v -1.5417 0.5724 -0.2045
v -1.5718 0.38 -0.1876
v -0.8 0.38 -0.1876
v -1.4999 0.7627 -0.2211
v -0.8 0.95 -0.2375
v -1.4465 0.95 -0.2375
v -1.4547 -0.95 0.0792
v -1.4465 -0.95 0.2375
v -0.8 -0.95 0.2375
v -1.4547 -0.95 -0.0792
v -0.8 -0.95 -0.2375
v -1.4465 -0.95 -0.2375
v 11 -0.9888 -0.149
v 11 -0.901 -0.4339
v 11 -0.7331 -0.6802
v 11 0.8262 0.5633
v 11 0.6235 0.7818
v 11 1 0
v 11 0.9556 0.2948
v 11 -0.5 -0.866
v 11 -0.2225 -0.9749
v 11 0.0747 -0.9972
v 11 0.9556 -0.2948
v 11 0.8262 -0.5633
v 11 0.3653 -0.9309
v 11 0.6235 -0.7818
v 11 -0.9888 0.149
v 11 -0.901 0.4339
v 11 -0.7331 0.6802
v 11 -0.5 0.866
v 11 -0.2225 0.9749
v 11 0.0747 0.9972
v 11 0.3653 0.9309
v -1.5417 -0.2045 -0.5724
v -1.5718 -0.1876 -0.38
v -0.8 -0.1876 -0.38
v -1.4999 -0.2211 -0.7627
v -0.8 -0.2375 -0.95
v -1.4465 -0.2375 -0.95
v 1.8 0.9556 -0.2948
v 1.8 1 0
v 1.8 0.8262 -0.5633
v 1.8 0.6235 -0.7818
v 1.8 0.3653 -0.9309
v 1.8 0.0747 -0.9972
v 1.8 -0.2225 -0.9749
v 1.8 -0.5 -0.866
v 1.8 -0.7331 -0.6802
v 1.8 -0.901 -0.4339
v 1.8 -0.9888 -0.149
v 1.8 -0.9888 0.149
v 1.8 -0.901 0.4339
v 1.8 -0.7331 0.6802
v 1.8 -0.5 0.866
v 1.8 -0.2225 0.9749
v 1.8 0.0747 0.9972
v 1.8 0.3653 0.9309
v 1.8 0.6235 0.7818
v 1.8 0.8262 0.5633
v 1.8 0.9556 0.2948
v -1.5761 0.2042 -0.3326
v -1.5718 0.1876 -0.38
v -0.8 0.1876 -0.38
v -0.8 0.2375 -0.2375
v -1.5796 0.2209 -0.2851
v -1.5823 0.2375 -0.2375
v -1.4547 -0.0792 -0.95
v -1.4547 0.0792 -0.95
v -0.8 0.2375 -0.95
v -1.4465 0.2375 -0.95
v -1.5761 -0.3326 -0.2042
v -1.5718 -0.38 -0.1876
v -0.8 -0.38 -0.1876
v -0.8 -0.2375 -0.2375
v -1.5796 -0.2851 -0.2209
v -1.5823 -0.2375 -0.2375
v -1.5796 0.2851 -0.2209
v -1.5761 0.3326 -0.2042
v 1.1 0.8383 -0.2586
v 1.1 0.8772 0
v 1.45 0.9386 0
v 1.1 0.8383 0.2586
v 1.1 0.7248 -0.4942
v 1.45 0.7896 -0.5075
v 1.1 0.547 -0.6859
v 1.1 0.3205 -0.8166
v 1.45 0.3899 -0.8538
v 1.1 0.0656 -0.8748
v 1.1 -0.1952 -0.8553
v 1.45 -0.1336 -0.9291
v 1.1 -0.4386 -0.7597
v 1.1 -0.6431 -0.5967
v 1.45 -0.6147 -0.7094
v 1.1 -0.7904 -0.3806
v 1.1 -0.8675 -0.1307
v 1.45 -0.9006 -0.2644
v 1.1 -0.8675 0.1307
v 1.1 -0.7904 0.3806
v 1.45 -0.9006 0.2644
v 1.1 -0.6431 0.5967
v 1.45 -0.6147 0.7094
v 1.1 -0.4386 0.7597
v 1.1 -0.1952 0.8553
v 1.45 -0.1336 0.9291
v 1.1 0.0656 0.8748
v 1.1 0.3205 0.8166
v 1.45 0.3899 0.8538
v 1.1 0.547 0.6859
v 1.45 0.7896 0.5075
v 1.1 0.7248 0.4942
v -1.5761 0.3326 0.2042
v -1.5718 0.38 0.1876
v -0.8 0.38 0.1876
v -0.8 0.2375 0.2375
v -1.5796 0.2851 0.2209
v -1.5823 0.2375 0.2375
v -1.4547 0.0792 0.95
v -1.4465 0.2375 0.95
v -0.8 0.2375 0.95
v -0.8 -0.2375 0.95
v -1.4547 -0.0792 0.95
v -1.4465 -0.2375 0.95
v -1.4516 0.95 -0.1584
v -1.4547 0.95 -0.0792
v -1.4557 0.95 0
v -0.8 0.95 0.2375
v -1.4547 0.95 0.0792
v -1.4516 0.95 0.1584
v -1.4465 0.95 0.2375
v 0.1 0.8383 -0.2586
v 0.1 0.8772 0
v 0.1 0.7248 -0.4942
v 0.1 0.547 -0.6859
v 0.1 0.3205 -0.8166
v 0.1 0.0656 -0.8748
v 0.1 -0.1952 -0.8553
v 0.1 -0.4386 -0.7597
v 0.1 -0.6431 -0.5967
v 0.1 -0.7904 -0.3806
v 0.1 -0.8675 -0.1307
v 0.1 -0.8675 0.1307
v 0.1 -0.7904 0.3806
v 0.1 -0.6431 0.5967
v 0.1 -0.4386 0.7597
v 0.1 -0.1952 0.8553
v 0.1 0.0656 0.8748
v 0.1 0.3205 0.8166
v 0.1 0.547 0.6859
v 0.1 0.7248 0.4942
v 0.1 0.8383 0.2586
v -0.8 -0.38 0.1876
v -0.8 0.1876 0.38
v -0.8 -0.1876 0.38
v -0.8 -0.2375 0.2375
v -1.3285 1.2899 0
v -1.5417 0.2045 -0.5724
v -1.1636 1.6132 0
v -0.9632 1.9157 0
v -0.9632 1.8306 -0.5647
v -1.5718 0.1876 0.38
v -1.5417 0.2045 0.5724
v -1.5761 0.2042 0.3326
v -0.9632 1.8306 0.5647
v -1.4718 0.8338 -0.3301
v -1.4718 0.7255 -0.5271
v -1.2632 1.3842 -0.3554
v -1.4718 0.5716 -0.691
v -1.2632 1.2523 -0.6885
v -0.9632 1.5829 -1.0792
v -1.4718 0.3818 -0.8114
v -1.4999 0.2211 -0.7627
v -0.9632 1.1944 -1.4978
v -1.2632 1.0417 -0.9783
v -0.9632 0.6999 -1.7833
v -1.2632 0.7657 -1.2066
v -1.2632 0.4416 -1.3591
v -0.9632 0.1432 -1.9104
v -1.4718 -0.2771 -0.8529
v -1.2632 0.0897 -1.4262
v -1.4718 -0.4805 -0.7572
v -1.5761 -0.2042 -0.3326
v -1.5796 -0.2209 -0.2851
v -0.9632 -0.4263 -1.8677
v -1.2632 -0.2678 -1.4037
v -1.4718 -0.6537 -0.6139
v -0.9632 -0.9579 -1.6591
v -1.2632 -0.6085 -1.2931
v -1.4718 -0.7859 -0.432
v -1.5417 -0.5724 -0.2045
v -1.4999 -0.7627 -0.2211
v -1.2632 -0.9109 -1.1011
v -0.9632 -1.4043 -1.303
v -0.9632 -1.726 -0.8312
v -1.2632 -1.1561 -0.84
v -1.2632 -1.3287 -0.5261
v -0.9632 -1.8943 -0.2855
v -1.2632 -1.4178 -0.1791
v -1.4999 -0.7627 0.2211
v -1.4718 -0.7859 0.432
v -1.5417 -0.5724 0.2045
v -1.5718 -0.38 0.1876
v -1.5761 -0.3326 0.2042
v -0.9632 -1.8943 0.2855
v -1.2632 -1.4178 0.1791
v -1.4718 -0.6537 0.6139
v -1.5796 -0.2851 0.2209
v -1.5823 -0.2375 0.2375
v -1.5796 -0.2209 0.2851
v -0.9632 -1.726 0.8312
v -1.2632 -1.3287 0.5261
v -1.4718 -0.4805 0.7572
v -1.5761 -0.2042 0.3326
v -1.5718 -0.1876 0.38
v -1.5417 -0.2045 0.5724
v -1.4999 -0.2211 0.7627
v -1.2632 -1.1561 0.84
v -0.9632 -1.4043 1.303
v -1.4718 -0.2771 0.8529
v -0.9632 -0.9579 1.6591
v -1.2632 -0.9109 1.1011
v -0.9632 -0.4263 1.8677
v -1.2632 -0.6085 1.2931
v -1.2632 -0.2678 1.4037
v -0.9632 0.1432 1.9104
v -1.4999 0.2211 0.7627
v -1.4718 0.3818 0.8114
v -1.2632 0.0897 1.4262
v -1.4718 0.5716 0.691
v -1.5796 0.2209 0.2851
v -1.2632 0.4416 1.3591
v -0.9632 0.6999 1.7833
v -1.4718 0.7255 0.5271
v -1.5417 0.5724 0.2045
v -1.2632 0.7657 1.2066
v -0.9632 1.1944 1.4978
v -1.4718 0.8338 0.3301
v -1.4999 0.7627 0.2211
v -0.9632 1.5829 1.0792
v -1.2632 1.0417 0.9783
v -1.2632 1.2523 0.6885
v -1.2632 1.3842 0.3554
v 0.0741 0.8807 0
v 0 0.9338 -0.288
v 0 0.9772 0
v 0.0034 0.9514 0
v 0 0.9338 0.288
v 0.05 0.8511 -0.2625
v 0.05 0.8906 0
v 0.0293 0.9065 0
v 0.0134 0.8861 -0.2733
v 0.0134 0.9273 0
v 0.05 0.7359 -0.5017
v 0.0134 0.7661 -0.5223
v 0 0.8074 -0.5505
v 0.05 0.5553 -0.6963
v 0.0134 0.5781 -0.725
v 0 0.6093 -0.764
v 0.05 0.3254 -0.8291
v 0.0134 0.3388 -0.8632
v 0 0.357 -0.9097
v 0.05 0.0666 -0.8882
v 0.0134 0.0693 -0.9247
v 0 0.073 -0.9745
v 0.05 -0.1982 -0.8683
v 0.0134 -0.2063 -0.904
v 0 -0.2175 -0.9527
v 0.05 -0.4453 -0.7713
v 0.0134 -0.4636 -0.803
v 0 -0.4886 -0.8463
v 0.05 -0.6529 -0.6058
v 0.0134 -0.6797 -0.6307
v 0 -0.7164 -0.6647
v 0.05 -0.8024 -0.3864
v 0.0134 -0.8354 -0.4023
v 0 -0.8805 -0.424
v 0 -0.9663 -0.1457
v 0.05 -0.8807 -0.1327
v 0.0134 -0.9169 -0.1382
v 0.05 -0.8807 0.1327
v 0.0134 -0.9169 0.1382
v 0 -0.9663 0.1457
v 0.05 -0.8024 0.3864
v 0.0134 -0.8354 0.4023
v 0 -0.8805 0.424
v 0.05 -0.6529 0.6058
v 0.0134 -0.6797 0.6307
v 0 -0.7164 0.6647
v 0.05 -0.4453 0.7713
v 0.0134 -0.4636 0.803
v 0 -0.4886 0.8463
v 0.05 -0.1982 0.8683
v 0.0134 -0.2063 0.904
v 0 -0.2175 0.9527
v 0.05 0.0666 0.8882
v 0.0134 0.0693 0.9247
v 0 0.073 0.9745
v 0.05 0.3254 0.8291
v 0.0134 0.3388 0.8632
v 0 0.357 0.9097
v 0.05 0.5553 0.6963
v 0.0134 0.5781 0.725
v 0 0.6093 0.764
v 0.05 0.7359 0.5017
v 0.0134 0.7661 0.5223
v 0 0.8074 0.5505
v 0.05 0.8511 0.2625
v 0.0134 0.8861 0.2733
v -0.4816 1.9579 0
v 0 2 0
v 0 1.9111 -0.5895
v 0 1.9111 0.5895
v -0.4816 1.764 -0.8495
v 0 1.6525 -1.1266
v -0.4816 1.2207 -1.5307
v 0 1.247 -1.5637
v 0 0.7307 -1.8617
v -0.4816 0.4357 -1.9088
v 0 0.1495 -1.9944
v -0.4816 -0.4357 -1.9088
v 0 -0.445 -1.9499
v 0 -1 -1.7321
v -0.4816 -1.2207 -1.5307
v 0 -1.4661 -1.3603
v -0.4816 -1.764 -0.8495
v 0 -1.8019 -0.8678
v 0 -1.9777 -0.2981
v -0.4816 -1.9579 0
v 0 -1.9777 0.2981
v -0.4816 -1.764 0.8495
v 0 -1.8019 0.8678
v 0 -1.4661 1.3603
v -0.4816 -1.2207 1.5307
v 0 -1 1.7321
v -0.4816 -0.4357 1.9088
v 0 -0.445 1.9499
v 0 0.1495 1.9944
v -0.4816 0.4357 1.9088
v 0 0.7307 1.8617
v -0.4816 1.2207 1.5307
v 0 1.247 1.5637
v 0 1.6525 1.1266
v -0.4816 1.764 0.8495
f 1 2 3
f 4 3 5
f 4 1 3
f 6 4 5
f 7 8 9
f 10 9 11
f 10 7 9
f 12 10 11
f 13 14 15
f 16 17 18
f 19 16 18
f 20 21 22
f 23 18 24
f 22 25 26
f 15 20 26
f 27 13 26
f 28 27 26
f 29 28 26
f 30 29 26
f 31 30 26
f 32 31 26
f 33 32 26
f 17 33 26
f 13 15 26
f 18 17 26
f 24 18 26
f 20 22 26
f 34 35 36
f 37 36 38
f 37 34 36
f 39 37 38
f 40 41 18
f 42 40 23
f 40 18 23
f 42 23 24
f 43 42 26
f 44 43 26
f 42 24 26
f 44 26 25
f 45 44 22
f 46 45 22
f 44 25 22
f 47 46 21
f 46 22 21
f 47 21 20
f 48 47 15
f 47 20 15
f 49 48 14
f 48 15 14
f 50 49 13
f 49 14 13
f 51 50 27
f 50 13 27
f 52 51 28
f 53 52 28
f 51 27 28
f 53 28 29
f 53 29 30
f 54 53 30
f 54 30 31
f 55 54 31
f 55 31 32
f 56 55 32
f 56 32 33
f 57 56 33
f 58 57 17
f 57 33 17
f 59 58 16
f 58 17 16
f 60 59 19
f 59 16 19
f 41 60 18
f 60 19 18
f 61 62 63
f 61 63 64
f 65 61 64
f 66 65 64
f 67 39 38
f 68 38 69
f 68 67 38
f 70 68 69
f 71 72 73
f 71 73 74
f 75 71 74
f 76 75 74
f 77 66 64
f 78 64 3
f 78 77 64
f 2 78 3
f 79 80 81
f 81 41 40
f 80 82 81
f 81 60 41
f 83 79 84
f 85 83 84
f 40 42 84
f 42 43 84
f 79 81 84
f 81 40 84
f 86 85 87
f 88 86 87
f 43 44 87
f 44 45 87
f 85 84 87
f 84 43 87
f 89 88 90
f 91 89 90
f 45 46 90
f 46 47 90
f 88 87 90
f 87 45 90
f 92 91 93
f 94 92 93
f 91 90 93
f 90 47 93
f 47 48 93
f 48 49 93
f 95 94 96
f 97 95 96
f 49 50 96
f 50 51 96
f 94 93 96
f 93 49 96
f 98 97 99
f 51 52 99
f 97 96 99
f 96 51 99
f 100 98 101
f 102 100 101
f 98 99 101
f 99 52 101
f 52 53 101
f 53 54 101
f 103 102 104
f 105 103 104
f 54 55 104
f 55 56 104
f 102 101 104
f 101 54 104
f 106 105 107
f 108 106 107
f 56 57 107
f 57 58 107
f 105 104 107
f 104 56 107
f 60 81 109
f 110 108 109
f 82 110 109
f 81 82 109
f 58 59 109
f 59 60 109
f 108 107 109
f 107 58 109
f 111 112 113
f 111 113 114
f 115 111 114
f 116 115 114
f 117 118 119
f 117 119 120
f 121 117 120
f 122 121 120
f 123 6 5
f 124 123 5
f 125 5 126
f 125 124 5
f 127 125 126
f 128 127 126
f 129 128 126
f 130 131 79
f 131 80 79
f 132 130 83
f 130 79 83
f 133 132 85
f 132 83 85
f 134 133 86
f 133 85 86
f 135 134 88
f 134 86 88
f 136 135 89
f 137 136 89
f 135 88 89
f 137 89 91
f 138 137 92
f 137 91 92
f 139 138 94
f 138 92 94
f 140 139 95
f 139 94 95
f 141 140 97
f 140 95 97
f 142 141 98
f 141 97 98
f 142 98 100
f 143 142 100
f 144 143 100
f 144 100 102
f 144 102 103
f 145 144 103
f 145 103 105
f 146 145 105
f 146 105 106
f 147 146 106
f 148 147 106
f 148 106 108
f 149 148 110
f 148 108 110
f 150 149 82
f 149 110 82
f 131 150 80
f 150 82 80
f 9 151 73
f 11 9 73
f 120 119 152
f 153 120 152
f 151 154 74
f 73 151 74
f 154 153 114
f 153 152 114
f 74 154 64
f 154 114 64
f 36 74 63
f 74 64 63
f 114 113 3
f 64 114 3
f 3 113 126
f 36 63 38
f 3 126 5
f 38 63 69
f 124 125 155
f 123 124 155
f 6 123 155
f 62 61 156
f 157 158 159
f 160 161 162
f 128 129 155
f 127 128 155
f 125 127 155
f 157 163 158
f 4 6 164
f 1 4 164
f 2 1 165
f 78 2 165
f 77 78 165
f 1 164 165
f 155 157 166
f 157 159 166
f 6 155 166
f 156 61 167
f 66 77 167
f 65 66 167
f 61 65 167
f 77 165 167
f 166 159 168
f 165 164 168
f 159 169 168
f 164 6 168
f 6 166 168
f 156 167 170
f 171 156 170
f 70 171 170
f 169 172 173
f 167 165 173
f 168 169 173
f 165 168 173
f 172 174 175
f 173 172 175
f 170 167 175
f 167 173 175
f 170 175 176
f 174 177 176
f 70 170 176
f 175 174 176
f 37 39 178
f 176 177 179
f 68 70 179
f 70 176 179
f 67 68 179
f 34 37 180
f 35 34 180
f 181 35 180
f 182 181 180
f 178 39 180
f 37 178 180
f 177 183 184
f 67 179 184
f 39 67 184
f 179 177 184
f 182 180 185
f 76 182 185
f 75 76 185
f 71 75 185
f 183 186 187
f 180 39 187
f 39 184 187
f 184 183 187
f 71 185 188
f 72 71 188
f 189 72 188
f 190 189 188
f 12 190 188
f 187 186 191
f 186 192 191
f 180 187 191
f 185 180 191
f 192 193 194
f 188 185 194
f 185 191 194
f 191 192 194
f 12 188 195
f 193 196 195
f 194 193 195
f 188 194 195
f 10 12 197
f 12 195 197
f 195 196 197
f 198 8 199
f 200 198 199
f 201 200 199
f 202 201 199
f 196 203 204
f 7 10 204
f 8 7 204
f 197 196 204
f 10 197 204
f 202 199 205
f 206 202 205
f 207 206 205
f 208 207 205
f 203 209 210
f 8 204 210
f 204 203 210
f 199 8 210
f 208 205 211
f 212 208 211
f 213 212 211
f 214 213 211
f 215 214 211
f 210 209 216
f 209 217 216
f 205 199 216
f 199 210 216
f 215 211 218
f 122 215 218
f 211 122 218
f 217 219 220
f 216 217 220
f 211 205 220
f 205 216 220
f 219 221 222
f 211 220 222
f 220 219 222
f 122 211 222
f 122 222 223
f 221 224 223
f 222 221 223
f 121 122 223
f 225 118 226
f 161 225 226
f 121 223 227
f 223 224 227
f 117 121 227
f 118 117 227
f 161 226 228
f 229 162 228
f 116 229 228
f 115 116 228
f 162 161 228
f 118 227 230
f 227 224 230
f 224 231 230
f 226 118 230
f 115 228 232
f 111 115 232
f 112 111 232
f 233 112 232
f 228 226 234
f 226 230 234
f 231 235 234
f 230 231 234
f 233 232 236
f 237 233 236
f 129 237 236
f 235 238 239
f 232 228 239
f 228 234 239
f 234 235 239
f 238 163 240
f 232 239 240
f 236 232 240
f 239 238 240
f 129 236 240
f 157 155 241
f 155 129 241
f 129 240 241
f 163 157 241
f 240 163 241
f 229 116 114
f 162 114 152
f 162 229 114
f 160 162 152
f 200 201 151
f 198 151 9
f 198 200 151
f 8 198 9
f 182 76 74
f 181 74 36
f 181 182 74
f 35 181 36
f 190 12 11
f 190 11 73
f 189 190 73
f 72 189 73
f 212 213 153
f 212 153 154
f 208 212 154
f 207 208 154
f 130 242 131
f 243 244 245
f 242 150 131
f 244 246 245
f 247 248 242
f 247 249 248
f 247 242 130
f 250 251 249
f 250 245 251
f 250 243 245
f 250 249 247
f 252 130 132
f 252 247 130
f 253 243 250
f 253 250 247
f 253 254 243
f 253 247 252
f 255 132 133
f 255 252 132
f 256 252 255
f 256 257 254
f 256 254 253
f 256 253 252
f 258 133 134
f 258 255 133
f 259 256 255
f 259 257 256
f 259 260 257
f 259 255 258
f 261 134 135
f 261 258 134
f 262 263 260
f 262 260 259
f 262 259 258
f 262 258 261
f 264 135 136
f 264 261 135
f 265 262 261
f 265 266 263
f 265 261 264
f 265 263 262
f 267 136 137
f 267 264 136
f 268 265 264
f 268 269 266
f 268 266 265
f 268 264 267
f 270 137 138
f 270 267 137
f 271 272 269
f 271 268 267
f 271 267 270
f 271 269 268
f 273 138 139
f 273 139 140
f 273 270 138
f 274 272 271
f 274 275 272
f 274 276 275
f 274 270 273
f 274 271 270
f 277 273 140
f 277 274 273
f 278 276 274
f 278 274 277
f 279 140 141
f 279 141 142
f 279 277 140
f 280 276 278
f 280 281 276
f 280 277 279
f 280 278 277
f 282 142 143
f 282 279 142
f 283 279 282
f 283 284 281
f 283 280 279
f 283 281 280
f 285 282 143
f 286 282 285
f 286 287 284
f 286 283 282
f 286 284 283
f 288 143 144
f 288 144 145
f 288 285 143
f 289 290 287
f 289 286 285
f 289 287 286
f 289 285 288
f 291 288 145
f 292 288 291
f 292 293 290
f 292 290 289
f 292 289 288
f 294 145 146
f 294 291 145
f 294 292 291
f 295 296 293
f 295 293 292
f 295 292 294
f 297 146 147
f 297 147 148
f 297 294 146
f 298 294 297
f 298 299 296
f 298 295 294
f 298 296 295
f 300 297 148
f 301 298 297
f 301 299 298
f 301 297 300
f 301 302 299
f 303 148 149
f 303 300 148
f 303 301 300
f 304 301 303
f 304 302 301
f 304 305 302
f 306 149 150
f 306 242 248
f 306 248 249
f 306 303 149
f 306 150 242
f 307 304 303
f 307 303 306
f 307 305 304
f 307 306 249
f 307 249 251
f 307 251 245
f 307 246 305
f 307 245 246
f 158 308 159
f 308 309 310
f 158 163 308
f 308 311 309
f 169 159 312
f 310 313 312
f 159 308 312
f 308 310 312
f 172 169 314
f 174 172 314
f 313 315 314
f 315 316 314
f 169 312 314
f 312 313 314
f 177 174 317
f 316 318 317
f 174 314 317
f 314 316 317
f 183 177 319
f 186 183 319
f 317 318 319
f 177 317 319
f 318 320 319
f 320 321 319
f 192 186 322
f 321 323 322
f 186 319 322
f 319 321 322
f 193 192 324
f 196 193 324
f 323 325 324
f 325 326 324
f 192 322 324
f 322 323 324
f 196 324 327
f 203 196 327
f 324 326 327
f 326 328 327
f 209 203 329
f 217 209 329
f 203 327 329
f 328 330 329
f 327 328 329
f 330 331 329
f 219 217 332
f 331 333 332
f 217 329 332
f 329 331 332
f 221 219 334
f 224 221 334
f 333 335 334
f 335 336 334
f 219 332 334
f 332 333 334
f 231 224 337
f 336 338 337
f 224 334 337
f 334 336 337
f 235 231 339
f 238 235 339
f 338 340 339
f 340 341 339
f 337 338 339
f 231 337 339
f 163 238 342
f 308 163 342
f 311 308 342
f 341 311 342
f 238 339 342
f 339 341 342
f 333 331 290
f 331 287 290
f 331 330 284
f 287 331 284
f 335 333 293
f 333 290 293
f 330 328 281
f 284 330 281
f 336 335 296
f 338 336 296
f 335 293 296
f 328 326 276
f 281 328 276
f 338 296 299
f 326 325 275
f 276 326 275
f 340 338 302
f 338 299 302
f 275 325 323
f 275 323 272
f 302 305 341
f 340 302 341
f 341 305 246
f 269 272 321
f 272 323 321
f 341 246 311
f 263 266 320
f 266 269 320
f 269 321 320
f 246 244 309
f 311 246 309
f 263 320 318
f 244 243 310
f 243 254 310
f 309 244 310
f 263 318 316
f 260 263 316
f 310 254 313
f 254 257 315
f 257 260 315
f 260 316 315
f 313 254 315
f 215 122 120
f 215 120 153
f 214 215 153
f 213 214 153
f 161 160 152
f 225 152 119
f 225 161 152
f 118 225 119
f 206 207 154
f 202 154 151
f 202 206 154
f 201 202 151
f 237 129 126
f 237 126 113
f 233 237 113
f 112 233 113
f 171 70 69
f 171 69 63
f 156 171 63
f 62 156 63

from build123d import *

# Parameters (mm, degrees)
CUT_EXTRUDE1_DEPTH = 0.8


with BuildPart() as part:
    # Sketch1 → Revolve1 (revolve)
    with BuildSketch(Plane.XY):
        with BuildLine():
            Line((-0.963195994, 1.91573127), (0, 2))
            Line((0, 2), (0, 0.87725))
            Line((0, 0.87725), (1.1, 0.87725))
            Line((1.1, 0.87725), (1.8, 1))
            Line((1.8, 1), (11, 1))
            Line((11, 1), (11, 0))
            Line((11, 0), (-1.6, 0))
            ThreePointArc((-1.6, 0), (-1.436628655, 1.009399034), (-0.963195994, 1.91573127))
        make_face()
    revolve(axis=Axis((11, 0, 0), (-1, 0, 0)))

    # Sketch2 → Revolve2 (revolve)
    with BuildSketch(Plane.XY):
        with BuildLine():
            Line((-0.1, 0.77725), (1.1, 0.77725))
            Line((1.1, 0.77725), (1.1, 0.87725))
            Line((1.1, 0.87725), (0.1, 0.87725))
            ThreePointArc((0.1, 0.87725), (0.029289322, 0.906539322), (0, 0.97725))
            Line((0, 0.97725), (-0.1, 0.97725))
            Line((-0.1, 0.97725), (-0.1, 0.77725))
        make_face()
    revolve(axis=Axis((1.1, 0, 0), (-1, 0, 0)))

    # Sketch3 → Cut-Extrude1 (cut)
    with BuildSketch(Plane(origin=(-1.6, 0, 0), x_dir=(0, 0, -1), z_dir=(1, 0, 0))):
        Polygon((-0.95, 0.2375), (-0.95, -0.2375), (-0.38, -0.187631462), (-0.2375, -0.2375), (-0.187631462, -0.38), (-0.2375, -0.95), (0.2375, -0.95), (0.187631462, -0.38), (0.2375, -0.2375), (0.38, -0.187631462), (0.95, -0.2375), (0.95, 0.2375), (0.38, 0.187631462), (0.2375, 0.2375), (0.187631462, 0.38), (0.2375, 0.95), (-0.2375, 0.95), (-0.187631462, 0.38), (-0.2375, 0.2375), (-0.38, 0.187631462), align=None)
    extrude(amount=CUT_EXTRUDE1_DEPTH, mode=Mode.SUBTRACT)


solid = part.part
